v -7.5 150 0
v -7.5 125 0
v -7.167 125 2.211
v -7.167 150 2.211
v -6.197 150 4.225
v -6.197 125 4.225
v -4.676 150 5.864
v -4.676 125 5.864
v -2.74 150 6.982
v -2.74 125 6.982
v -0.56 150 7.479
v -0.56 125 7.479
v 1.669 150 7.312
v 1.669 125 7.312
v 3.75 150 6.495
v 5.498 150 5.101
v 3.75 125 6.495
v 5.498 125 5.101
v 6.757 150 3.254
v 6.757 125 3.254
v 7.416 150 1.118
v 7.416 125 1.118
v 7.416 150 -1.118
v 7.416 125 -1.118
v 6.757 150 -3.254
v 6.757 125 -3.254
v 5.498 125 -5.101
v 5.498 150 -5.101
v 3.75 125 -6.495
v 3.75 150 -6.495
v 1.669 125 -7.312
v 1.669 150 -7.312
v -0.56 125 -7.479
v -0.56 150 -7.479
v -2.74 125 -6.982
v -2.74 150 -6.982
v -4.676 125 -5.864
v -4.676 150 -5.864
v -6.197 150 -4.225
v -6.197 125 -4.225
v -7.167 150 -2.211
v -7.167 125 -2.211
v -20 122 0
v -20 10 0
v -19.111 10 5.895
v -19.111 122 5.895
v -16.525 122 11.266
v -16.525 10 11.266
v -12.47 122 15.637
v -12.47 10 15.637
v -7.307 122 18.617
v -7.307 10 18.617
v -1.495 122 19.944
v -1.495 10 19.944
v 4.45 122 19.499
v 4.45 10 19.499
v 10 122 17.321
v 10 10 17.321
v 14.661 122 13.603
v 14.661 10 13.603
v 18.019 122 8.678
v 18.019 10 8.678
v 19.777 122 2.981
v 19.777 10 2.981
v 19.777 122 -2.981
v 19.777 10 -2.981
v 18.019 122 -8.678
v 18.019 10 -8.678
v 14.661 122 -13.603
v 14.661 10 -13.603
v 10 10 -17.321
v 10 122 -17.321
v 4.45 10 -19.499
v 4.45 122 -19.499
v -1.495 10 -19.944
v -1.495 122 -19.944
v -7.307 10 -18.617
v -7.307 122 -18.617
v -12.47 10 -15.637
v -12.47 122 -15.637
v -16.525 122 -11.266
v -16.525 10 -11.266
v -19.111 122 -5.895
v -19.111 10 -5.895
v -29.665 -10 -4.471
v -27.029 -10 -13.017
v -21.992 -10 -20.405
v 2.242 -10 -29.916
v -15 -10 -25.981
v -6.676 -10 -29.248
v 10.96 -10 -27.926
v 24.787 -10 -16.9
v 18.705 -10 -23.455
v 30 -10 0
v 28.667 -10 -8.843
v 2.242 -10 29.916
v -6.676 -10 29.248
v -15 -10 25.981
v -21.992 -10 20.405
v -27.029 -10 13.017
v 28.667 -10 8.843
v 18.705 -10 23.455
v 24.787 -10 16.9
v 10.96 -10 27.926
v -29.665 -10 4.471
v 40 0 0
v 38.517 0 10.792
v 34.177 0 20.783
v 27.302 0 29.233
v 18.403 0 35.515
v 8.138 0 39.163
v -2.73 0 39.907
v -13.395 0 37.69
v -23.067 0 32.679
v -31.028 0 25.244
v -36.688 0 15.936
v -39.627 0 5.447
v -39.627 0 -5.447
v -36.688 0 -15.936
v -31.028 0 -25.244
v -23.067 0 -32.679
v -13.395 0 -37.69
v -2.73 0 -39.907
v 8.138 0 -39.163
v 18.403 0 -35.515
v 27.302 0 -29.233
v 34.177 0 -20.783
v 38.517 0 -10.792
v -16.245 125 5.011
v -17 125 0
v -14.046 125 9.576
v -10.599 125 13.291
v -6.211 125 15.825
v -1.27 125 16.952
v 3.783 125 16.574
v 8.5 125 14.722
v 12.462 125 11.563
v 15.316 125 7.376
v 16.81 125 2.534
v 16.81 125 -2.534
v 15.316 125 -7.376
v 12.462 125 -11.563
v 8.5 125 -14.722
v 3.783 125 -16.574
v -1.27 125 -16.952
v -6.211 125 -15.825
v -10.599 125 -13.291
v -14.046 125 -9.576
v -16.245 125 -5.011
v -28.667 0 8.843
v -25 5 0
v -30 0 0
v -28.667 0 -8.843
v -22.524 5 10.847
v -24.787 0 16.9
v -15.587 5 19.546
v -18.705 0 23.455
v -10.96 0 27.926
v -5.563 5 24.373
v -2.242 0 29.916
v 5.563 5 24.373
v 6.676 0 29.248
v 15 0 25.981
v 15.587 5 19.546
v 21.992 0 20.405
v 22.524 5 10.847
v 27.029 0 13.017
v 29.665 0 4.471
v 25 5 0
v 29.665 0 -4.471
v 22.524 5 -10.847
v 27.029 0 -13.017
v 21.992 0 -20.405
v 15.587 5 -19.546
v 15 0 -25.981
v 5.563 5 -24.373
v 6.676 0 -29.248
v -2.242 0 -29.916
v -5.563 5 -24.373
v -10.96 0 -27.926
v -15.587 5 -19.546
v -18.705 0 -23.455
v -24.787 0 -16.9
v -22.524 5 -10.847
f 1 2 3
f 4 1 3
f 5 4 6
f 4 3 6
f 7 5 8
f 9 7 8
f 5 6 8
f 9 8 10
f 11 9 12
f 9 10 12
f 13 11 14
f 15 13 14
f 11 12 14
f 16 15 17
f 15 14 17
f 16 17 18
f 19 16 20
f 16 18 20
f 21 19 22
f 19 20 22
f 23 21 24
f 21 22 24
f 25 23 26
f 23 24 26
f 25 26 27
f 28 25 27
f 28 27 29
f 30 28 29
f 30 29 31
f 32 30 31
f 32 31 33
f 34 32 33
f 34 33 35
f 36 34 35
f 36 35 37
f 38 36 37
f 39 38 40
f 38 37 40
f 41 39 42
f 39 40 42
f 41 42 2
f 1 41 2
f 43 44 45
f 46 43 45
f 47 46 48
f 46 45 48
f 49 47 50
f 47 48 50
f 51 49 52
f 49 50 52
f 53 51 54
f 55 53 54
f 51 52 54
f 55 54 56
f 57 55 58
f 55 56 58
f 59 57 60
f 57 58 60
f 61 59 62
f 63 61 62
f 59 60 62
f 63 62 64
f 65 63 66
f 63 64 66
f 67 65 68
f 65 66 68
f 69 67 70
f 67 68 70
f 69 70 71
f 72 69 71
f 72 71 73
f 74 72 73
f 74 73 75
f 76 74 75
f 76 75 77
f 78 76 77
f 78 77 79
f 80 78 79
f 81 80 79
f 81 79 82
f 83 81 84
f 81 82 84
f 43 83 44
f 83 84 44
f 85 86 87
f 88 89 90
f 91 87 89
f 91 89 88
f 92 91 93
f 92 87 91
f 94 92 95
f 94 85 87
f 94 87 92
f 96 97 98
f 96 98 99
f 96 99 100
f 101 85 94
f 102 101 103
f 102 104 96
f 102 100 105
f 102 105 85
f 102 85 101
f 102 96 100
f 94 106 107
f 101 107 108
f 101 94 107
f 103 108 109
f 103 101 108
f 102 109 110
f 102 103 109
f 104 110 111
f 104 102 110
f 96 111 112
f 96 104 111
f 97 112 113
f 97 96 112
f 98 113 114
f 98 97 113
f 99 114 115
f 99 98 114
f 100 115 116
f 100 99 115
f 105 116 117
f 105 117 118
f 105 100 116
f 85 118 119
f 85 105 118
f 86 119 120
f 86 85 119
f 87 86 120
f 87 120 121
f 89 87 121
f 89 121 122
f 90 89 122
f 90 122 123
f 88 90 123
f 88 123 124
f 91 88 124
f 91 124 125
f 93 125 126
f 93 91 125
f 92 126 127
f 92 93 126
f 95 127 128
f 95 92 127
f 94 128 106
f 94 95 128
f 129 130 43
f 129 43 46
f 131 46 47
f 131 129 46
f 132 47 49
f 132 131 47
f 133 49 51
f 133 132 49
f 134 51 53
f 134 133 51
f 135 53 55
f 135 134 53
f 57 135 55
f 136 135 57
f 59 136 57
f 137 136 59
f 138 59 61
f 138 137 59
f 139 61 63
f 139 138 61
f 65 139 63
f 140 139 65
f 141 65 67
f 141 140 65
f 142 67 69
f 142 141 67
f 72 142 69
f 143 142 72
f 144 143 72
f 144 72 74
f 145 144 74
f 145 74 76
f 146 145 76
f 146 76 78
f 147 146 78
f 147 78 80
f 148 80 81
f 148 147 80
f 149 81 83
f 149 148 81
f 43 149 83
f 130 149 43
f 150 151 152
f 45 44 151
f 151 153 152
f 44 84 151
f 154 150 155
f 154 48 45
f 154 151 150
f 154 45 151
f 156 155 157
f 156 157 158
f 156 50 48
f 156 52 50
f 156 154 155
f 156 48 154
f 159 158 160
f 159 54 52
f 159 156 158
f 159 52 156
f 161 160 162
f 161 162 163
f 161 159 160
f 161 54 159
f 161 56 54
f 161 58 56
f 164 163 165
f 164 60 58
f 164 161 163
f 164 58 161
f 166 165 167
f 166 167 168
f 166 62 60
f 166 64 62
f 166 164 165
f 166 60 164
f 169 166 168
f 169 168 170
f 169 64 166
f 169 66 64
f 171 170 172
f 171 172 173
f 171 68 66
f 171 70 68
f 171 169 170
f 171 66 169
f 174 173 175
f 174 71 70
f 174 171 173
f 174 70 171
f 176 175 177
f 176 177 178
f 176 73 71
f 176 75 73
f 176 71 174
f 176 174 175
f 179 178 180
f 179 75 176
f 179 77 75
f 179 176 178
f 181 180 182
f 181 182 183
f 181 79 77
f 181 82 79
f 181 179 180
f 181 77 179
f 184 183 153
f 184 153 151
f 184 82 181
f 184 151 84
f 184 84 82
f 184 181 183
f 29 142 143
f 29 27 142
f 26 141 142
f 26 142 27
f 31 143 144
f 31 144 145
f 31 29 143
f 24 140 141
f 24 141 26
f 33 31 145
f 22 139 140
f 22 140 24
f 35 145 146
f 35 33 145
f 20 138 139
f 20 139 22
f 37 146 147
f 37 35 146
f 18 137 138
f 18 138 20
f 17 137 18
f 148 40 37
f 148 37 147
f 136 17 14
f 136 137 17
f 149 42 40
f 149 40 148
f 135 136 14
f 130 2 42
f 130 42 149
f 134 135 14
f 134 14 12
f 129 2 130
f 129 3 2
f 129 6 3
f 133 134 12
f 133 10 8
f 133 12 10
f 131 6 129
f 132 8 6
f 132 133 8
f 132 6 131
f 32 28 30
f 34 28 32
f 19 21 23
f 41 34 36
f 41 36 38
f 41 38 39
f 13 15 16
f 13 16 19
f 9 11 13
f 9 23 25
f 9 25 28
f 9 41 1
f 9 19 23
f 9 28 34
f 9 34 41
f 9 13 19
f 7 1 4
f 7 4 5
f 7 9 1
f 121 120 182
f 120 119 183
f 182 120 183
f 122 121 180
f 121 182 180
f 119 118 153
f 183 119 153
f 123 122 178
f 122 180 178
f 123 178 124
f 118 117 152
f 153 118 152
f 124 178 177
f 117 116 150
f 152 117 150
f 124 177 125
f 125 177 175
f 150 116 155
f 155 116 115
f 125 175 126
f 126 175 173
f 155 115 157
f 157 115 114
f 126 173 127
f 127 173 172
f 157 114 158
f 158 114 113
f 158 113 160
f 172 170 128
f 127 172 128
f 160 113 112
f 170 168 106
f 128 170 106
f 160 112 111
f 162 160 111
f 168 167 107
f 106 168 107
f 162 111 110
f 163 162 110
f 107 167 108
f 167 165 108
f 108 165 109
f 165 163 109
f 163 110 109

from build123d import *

# Parameters (mm, degrees)
F0_R      = 40
F1_DEPTH  = 10
F3_SIZE   = 9.99999
F2_R      = 30
F4_DEPTH  = 10
F5_SIZE   = 9.99999
F6_R      = 20
F7_DEPTH  = 115
F8_SIZE   = 3
F9_R      = 7.5
F10_DEPTH = 25


# Not quite as in the source:
# - a fillet or chamfer is up to 0.001 mm smaller than in the source, because OpenCascade refuses the exact size


with BuildPart() as f1:
    # F0 (on Front) → F1 (new body)
    with BuildSketch(Plane.XZ):
        Circle(F0_R)
    extrude(amount=F1_DEPTH)

    # F3 (size 10 in the source; OpenCascade refuses exactly that, so slightly less here)
    f3_edges = [f1.edges().sort_by_distance(p)[0] for p in [
        (-40, -10, 0),
    ]]
    chamfer(f3_edges, length=F3_SIZE)

    # F2 (on face) → F4 (join)
    with BuildSketch(Plane(origin=(0, 0, 0), x_dir=(-1, 0, 0), z_dir=(0, 1, 0))):
        Circle(F2_R)
    extrude(amount=F4_DEPTH)

    # F5 (size 10 in the source; OpenCascade refuses exactly that, so slightly less here)
    f5_edges = [f1.edges().sort_by_distance(p)[0] for p in [
        (30, 10, 0),
    ]]
    chamfer(f5_edges, length=F5_SIZE)

    # F6 (on face) → F7 (join)
    with BuildSketch(Plane(origin=(0, 10, 0), x_dir=(-1, 0, 0), z_dir=(0, 1, 0))):
        Circle(F6_R)
    extrude(amount=F7_DEPTH)

    # F8
    f8_edges = [f1.edges().sort_by_distance(p)[0] for p in [
        (20, 125, 0),
    ]]
    chamfer(f8_edges, length=F8_SIZE)

    # F9 (on face) → F10 (join)
    with BuildSketch(Plane(origin=(0, 125, 0), x_dir=(-1, 0, 0), z_dir=(0, 1, 0))):
        Circle(F9_R)
    extrude(amount=F10_DEPTH)


solid = f1.part
